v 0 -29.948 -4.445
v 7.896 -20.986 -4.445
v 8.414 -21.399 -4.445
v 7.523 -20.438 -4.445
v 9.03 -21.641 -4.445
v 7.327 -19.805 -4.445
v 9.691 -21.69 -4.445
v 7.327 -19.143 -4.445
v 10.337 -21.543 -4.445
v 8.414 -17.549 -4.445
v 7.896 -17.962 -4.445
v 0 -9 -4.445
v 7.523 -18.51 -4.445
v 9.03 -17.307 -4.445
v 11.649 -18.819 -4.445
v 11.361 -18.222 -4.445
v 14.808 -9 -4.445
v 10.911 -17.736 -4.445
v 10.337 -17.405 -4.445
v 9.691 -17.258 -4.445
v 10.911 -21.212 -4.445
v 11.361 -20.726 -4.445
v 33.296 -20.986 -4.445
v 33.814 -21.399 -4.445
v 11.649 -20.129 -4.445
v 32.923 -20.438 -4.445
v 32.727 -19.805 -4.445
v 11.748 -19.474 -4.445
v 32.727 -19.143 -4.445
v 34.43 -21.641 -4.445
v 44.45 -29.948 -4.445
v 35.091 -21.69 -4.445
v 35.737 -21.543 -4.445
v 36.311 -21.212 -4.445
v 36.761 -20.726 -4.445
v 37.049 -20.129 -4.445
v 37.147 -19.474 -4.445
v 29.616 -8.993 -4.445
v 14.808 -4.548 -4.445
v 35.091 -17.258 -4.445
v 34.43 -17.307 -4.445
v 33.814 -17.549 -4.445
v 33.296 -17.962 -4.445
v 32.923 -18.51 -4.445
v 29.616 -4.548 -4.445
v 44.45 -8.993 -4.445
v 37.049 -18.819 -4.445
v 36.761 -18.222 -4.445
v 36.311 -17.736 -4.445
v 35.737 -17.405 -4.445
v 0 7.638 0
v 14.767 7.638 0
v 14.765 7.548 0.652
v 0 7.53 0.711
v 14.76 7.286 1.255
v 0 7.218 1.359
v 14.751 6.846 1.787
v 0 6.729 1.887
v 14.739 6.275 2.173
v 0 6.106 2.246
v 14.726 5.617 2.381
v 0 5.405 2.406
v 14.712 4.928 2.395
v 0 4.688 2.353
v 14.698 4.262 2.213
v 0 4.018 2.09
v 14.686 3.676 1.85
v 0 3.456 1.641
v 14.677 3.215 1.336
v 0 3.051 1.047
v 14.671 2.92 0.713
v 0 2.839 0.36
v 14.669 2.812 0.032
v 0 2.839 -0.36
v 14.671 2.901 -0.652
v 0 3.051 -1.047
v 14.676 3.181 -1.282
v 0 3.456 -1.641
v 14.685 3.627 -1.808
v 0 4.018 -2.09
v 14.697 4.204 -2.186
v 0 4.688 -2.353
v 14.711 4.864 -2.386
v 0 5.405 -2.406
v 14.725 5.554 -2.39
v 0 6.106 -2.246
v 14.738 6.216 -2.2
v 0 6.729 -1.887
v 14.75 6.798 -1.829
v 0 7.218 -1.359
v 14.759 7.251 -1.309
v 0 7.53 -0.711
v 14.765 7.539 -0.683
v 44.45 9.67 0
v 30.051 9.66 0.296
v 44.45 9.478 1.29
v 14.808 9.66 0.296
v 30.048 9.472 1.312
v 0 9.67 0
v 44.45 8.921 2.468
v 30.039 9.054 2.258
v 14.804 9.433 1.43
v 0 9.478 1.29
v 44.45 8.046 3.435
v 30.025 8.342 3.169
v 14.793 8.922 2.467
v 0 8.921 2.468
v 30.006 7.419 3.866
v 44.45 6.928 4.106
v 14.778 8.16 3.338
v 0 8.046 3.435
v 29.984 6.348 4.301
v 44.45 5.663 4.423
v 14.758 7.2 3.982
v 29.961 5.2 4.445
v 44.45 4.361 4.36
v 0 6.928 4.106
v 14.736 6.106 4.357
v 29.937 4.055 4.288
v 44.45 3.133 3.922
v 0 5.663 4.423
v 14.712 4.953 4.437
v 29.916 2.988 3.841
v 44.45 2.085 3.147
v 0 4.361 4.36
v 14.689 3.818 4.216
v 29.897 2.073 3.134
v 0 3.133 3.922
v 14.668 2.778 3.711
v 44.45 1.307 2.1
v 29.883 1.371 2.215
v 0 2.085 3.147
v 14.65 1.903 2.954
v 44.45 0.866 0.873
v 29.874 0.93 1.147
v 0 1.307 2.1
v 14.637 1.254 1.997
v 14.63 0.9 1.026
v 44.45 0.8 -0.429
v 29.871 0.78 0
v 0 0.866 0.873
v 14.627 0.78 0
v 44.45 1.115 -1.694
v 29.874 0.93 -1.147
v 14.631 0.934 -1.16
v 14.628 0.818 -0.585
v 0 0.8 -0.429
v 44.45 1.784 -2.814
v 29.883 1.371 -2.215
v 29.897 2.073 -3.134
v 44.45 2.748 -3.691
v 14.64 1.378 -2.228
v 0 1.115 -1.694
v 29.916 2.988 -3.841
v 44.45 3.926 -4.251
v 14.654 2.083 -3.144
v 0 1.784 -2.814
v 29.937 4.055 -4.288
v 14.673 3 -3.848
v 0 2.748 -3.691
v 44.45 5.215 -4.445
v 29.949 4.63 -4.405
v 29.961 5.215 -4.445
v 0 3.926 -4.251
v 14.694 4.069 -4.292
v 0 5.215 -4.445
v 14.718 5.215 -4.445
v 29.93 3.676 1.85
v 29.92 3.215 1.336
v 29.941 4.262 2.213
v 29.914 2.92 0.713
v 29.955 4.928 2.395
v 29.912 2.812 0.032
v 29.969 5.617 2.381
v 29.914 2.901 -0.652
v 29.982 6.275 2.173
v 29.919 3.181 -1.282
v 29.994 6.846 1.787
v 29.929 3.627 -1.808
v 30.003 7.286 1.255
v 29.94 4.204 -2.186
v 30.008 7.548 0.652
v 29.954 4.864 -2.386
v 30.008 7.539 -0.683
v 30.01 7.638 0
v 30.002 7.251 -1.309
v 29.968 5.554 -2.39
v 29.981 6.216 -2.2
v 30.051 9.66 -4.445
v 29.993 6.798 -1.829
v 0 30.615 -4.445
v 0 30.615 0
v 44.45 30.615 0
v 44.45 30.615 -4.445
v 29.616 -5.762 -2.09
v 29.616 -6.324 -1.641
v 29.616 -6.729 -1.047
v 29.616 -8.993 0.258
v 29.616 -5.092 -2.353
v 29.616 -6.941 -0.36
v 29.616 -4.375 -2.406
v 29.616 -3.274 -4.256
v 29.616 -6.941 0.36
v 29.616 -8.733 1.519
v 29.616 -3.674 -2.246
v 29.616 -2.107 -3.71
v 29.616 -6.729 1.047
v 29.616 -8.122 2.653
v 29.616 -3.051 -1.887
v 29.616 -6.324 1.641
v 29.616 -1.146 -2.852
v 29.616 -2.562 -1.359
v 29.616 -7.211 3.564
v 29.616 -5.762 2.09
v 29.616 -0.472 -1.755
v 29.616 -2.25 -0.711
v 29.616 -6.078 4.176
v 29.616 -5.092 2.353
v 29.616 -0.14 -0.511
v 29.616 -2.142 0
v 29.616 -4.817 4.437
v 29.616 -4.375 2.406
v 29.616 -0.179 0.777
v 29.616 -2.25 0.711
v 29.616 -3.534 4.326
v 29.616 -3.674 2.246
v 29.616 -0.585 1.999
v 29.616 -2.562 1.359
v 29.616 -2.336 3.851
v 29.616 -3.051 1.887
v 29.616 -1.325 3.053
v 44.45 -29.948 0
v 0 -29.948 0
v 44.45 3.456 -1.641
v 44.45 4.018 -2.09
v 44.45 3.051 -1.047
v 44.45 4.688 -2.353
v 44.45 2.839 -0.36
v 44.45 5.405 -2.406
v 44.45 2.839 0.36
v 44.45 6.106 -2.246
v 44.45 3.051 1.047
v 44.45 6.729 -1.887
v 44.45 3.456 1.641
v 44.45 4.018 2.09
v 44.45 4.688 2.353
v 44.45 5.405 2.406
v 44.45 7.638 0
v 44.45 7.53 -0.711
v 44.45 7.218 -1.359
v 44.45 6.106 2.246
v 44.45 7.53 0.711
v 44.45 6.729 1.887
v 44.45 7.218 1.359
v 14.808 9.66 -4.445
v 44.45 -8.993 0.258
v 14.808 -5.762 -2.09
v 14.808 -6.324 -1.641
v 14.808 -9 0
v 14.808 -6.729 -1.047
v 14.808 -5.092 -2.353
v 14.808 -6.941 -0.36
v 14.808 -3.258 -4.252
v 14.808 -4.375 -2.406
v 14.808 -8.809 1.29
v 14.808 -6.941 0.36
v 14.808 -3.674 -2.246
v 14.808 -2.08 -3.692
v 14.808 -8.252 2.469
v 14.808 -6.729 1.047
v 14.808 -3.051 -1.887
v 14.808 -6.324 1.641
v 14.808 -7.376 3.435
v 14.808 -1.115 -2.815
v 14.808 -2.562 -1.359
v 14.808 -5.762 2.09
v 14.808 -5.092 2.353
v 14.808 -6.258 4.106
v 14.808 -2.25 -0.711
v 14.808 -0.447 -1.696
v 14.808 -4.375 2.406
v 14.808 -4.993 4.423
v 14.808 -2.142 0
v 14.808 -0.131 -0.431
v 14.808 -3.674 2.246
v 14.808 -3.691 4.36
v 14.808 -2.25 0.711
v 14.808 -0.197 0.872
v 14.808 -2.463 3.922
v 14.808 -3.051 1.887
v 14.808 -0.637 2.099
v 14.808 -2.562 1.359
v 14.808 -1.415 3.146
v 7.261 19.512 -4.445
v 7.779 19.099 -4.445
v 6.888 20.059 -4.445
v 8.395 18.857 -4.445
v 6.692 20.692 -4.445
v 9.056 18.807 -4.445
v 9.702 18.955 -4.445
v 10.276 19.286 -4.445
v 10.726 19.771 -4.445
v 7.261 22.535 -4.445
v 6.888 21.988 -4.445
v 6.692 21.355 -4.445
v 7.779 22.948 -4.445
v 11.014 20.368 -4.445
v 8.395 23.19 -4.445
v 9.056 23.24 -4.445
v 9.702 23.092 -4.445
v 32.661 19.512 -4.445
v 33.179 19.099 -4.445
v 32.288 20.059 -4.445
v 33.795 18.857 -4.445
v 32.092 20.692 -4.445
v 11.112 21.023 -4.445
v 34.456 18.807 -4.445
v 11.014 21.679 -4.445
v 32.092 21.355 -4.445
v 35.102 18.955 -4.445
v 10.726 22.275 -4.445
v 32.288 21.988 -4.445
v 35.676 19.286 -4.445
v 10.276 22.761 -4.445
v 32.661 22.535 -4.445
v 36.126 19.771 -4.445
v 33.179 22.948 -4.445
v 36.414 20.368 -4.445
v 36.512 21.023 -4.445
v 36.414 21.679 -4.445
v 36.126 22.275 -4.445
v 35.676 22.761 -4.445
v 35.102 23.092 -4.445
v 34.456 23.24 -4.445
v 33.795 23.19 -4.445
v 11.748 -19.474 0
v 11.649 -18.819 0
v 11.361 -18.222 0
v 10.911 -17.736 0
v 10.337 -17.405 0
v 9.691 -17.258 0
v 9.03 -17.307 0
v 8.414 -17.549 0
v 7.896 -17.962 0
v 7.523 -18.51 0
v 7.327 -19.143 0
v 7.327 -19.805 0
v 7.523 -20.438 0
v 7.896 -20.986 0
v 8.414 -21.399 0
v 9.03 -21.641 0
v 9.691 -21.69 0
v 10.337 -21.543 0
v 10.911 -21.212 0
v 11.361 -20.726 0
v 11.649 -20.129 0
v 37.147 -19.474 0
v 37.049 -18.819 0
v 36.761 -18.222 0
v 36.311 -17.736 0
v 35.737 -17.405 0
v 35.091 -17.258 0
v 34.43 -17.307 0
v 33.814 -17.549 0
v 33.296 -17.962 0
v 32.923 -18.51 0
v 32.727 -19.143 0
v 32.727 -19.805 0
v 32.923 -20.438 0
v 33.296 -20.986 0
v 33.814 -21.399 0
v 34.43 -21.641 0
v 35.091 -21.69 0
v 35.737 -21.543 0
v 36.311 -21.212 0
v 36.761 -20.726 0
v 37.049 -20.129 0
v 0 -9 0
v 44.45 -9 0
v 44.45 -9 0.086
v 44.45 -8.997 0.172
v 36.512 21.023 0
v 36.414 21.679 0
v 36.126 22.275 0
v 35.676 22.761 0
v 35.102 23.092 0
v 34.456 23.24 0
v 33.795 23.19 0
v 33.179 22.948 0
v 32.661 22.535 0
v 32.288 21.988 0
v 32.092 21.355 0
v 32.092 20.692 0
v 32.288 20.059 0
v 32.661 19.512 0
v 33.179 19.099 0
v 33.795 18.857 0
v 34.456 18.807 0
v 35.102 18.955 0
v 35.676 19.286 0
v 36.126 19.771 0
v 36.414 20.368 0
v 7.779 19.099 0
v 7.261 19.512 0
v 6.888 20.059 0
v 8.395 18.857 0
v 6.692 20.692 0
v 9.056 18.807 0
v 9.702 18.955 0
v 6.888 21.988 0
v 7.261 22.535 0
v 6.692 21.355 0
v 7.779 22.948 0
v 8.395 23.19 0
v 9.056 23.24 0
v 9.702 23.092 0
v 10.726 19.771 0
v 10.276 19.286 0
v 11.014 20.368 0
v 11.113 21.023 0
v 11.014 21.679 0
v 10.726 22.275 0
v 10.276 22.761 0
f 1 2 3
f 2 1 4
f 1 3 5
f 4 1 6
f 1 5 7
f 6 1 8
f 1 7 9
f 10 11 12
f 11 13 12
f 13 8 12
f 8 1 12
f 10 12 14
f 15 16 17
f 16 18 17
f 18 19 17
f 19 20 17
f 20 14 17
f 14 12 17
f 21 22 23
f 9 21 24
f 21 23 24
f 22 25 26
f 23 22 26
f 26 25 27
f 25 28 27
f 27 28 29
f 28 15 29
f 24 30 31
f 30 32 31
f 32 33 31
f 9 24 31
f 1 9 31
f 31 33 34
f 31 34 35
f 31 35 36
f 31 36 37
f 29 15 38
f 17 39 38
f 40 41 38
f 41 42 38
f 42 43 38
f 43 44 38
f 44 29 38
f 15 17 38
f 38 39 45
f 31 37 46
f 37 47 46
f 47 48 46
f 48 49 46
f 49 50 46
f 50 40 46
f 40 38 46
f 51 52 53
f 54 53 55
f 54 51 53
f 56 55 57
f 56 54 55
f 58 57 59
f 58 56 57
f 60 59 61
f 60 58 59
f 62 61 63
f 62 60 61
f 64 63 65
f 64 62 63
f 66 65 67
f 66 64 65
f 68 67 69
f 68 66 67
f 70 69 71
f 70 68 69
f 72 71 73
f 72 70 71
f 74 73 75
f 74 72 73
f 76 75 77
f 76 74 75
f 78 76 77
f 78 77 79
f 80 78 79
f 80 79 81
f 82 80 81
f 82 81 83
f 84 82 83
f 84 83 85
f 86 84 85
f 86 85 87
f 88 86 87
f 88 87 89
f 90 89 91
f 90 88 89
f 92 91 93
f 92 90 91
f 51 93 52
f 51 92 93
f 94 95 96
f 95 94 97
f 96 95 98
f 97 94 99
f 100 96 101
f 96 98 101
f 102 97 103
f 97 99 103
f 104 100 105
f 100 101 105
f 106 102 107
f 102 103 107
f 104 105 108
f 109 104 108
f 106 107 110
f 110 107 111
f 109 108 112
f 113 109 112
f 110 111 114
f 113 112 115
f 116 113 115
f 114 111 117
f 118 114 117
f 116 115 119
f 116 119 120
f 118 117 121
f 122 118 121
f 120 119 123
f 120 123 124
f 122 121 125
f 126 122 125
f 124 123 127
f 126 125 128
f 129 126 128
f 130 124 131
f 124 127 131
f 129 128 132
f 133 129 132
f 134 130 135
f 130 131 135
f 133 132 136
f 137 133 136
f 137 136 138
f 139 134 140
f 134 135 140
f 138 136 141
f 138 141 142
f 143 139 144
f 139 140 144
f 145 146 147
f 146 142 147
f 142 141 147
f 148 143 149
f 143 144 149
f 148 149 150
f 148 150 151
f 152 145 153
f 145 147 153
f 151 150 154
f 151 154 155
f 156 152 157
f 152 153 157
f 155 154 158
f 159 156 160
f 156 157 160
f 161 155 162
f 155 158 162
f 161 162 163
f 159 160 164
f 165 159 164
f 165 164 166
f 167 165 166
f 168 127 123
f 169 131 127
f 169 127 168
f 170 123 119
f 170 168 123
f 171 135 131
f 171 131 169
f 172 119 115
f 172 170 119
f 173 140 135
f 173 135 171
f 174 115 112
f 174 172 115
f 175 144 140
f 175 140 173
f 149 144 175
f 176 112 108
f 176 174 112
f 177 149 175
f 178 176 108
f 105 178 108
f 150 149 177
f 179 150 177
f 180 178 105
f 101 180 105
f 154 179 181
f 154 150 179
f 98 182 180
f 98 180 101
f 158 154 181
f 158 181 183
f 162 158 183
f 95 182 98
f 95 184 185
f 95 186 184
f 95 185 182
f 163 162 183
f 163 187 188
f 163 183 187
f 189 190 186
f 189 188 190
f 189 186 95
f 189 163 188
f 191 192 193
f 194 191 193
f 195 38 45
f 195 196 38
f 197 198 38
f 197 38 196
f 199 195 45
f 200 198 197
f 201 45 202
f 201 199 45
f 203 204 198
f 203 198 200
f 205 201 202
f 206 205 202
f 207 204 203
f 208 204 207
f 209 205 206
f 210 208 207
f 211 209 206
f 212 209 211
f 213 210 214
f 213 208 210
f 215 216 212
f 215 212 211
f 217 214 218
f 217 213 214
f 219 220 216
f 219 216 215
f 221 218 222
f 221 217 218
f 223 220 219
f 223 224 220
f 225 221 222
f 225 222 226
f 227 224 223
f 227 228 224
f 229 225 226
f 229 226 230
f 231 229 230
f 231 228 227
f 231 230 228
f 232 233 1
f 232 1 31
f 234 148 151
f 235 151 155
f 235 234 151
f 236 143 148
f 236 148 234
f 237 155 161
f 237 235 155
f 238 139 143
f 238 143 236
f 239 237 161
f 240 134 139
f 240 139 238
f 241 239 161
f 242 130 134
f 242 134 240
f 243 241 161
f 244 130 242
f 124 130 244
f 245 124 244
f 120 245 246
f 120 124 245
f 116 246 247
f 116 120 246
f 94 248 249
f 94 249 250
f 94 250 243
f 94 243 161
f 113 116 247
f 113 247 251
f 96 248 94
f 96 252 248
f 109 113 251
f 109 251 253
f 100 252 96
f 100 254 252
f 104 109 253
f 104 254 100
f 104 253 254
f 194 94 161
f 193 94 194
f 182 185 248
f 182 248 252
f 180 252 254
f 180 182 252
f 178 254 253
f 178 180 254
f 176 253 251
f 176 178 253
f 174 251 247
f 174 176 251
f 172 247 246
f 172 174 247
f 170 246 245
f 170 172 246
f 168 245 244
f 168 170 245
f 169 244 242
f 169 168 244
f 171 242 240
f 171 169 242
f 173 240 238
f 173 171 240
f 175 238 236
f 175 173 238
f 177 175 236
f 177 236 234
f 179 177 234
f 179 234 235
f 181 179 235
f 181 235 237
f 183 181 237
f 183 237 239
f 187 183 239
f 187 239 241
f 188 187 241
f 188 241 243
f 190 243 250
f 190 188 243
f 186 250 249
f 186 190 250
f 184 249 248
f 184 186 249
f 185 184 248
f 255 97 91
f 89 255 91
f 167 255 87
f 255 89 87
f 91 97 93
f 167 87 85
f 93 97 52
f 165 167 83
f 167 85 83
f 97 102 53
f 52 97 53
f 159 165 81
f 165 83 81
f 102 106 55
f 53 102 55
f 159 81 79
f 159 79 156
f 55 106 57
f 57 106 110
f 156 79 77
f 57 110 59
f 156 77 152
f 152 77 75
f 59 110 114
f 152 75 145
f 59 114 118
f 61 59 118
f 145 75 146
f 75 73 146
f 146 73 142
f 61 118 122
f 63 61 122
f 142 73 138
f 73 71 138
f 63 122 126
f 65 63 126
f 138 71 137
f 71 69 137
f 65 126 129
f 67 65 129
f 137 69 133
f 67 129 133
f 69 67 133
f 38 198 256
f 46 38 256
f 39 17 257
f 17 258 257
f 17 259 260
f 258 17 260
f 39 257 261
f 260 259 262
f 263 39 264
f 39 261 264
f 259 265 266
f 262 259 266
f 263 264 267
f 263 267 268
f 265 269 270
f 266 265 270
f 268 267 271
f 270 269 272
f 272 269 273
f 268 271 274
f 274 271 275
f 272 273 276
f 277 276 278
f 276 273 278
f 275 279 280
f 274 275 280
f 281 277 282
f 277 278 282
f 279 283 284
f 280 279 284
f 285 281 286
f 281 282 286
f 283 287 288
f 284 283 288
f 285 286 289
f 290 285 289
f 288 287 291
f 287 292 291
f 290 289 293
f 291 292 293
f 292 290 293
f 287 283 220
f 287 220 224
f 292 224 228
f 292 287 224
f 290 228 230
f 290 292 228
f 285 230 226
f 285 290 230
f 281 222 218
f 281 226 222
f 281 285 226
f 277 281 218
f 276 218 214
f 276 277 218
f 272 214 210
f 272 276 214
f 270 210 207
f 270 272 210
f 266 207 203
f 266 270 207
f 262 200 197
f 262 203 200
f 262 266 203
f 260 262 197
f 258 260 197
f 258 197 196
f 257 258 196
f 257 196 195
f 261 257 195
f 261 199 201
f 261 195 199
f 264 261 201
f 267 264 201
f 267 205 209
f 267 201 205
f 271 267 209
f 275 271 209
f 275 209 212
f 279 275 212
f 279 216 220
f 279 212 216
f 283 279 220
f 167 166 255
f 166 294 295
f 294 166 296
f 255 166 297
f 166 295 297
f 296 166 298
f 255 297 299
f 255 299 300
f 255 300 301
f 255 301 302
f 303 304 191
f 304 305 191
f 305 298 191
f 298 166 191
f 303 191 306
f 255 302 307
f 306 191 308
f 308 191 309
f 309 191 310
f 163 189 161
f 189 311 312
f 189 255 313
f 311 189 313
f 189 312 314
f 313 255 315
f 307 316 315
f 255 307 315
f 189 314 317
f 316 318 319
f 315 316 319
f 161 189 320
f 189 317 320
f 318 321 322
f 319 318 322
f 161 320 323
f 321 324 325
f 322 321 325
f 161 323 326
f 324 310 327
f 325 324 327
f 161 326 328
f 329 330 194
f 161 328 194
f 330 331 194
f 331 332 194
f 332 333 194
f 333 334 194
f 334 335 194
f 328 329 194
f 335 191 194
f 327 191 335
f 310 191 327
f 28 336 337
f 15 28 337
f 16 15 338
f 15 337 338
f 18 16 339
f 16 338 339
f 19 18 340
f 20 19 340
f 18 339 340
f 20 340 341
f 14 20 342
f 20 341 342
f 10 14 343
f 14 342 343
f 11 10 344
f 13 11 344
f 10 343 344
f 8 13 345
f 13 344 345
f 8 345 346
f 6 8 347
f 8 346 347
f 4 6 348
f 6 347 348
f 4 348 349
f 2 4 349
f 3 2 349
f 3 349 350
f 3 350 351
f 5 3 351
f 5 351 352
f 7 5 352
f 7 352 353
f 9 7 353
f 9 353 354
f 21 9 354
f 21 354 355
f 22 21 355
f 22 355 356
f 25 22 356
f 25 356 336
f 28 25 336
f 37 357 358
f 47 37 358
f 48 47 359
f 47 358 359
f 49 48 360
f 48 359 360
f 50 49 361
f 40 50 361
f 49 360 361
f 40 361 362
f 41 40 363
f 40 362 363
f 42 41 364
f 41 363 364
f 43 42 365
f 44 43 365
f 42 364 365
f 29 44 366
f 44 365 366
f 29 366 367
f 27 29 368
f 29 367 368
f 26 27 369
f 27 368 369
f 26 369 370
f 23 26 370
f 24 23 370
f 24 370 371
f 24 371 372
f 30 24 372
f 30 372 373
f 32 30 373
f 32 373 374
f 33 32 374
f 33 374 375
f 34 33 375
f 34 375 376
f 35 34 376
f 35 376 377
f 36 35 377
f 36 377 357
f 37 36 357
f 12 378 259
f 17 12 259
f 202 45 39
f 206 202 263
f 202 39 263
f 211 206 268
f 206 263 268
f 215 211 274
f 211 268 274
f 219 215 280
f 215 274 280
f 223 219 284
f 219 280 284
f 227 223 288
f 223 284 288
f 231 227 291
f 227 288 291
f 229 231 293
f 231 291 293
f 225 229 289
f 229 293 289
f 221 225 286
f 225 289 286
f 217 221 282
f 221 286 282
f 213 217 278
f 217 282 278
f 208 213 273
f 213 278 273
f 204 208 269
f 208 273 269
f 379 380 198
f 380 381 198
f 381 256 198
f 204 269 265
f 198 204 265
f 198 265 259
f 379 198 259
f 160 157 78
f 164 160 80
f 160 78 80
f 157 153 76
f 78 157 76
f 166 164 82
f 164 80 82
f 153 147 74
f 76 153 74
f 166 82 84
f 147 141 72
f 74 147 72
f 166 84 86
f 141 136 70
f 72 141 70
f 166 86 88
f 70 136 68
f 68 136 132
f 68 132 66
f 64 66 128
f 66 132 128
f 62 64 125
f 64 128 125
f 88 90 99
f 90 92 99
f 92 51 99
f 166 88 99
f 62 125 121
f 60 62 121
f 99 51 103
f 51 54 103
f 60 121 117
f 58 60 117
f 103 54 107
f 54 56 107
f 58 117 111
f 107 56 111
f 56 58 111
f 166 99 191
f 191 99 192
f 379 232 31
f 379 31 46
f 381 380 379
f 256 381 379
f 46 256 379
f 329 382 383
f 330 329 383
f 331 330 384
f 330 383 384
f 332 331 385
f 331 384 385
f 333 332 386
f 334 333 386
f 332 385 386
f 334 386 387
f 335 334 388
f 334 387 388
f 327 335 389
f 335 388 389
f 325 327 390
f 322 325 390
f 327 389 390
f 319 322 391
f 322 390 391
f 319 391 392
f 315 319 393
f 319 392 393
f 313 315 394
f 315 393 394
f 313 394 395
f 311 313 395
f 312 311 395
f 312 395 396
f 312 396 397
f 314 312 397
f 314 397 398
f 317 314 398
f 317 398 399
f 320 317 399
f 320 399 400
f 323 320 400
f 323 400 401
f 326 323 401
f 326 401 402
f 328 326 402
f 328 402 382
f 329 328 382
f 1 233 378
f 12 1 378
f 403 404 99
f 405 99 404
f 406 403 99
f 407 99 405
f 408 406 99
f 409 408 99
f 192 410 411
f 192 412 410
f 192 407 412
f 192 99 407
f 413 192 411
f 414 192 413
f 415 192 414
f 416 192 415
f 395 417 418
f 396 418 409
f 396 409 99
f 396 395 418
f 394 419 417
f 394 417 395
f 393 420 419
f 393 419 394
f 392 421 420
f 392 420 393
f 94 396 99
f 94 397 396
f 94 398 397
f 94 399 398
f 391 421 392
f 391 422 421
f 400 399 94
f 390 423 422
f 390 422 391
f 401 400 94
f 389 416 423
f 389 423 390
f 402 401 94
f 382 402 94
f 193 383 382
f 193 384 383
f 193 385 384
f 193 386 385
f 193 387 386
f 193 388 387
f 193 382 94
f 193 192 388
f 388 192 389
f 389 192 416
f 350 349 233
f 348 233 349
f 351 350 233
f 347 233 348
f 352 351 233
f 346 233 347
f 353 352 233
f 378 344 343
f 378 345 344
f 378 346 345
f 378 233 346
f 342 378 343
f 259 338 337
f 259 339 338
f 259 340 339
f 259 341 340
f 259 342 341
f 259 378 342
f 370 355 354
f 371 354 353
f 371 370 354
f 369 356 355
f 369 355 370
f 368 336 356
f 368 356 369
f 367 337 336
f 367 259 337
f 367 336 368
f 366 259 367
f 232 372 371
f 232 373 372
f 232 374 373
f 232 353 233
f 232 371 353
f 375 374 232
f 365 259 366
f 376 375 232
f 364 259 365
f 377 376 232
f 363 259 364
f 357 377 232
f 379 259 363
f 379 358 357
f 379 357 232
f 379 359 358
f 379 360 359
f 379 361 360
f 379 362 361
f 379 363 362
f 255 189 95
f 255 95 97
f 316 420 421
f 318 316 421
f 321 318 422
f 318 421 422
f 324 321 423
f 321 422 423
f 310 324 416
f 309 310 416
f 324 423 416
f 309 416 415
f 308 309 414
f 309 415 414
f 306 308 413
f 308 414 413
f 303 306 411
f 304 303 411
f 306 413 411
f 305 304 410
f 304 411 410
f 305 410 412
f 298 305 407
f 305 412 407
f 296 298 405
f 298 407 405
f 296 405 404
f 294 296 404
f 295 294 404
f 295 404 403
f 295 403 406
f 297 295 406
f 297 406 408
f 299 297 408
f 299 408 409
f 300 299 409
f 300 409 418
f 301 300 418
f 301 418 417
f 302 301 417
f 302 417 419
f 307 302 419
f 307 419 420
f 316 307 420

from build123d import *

# Parameters (mm, degrees)
F0_W           = 44.45
F0_H           = 25.4
F2_DEPTH       = 4.445
F3_DEPTH       = 4.445
F1_R           = 4.445
F4_DEPTH       = 44.45
F6_W           = 14.8082
F6_H           = 8.89
F6_W_2         = 14.859
F7_DEPTH       = 5.08
F7_DEPTH_BACK  = 5.08
F8_DEPTH       = 5.08
F8_DEPTH_BACK  = 5.08
F9_R           = 2.413
F10_DEPTH      = 44.451
F11_R          = 2.413
F12_DEPTH      = 44.451
F13_R          = 2.2225
F14_DEPTH      = 4.446
F14_DEPTH_BACK = 4.446
F15_R          = 2.2225
F16_DEPTH      = 4.446


with BuildPart() as f2:
    # F0 (on Top) → F2 (new body)
    with BuildSketch(Plane.XY):
        with Locations((22.225, 17.9148047835)):
            Rectangle(F0_W, F0_H)
    extrude(amount=-F2_DEPTH)


with BuildPart() as f3:
    # F0 (on Top) → F3 (new body)
    with BuildSketch(Plane.XY):
        with Locations((22.225, -17.2478769302)):
            Rectangle(F0_W, F0_H)
    extrude(amount=-F3_DEPTH)


with BuildPart() as f4:
    # F1 (on Right) → F4 (new body)
    with BuildSketch(Plane.YZ):
        with Locations((5.2246893756, 0)):
            Circle(F1_R)
    extrude(amount=F4_DEPTH)


with BuildPart() as f4b:
    # F1 (on Right) → F4, piece 2 (new body)
    with BuildSketch(Plane.YZ):
        with Locations((-4.5553469099, 0)):
            Circle(F1_R)
    extrude(amount=F4_DEPTH)


with BuildPart() as f4_1:
    add(f4.part)

    # F5: union F2, F4b, F3
    add(f2.part)
    add(f4b.part)
    add(f3.part)

    # F6 (on Top) → F7 (cut, two sides)
    with BuildSketch(Plane.XY) as f7_sk:
        with Locations((7.4041, -4.5553469099)):
            Rectangle(F6_W, F6_H)
        with Locations((37.0459, -4.5478769302)):
            Rectangle(F6_W_2, F6_H)
    extrude(amount=-F7_DEPTH, mode=Mode.SUBTRACT)
    extrude(f7_sk.sketch, amount=F7_DEPTH_BACK, mode=Mode.SUBTRACT)

    # F6 (on Top) → F8 (cut, two sides)
    with BuildSketch(Plane.XY) as f8_sk:
        Polygon((30.0513568694, 9.6598047835), (14.8082, 9.6598047835), (14.6272431306, 0.7698047835), (29.8704, 0.7698047835), align=None)
    extrude(amount=-F8_DEPTH, mode=Mode.SUBTRACT)
    extrude(f8_sk.sketch, amount=F8_DEPTH_BACK, mode=Mode.SUBTRACT)

    # F9 (on face) → F10 (cut, through all)
    with BuildSketch(Plane.YZ):
        with Locations((-4.5553469099, 0)):
            Circle(F9_R)
    extrude(amount=F10_DEPTH, mode=Mode.SUBTRACT)

    # F11 (on face) → F12 (cut, through all)
    with BuildSketch(Plane.YZ):
        with Locations((5.2246893756, 0)):
            Circle(F11_R)
    extrude(amount=F12_DEPTH, mode=Mode.SUBTRACT)

    # F13 (on face) → F14 (cut, two sides)
    with BuildSketch(Plane.XY) as f14_sk:
        with Locations((8.89, 21.0234560072)):
            Circle(F13_R)
        with Locations((34.29, 21.0234560072)):
            Circle(F13_R)
    extrude(amount=-F14_DEPTH, mode=Mode.SUBTRACT)
    extrude(f14_sk.sketch, amount=F14_DEPTH_BACK, mode=Mode.SUBTRACT)

    # F15 (on face) → F16 (cut, through all)
    with BuildSketch(Plane.XY):
        with Locations((34.925, -19.4741119201)):
            Circle(F15_R)
        with Locations((9.525, -19.4741119201)):
            Circle(F15_R)
    extrude(amount=-F16_DEPTH, mode=Mode.SUBTRACT)


solid = f4_1.part
